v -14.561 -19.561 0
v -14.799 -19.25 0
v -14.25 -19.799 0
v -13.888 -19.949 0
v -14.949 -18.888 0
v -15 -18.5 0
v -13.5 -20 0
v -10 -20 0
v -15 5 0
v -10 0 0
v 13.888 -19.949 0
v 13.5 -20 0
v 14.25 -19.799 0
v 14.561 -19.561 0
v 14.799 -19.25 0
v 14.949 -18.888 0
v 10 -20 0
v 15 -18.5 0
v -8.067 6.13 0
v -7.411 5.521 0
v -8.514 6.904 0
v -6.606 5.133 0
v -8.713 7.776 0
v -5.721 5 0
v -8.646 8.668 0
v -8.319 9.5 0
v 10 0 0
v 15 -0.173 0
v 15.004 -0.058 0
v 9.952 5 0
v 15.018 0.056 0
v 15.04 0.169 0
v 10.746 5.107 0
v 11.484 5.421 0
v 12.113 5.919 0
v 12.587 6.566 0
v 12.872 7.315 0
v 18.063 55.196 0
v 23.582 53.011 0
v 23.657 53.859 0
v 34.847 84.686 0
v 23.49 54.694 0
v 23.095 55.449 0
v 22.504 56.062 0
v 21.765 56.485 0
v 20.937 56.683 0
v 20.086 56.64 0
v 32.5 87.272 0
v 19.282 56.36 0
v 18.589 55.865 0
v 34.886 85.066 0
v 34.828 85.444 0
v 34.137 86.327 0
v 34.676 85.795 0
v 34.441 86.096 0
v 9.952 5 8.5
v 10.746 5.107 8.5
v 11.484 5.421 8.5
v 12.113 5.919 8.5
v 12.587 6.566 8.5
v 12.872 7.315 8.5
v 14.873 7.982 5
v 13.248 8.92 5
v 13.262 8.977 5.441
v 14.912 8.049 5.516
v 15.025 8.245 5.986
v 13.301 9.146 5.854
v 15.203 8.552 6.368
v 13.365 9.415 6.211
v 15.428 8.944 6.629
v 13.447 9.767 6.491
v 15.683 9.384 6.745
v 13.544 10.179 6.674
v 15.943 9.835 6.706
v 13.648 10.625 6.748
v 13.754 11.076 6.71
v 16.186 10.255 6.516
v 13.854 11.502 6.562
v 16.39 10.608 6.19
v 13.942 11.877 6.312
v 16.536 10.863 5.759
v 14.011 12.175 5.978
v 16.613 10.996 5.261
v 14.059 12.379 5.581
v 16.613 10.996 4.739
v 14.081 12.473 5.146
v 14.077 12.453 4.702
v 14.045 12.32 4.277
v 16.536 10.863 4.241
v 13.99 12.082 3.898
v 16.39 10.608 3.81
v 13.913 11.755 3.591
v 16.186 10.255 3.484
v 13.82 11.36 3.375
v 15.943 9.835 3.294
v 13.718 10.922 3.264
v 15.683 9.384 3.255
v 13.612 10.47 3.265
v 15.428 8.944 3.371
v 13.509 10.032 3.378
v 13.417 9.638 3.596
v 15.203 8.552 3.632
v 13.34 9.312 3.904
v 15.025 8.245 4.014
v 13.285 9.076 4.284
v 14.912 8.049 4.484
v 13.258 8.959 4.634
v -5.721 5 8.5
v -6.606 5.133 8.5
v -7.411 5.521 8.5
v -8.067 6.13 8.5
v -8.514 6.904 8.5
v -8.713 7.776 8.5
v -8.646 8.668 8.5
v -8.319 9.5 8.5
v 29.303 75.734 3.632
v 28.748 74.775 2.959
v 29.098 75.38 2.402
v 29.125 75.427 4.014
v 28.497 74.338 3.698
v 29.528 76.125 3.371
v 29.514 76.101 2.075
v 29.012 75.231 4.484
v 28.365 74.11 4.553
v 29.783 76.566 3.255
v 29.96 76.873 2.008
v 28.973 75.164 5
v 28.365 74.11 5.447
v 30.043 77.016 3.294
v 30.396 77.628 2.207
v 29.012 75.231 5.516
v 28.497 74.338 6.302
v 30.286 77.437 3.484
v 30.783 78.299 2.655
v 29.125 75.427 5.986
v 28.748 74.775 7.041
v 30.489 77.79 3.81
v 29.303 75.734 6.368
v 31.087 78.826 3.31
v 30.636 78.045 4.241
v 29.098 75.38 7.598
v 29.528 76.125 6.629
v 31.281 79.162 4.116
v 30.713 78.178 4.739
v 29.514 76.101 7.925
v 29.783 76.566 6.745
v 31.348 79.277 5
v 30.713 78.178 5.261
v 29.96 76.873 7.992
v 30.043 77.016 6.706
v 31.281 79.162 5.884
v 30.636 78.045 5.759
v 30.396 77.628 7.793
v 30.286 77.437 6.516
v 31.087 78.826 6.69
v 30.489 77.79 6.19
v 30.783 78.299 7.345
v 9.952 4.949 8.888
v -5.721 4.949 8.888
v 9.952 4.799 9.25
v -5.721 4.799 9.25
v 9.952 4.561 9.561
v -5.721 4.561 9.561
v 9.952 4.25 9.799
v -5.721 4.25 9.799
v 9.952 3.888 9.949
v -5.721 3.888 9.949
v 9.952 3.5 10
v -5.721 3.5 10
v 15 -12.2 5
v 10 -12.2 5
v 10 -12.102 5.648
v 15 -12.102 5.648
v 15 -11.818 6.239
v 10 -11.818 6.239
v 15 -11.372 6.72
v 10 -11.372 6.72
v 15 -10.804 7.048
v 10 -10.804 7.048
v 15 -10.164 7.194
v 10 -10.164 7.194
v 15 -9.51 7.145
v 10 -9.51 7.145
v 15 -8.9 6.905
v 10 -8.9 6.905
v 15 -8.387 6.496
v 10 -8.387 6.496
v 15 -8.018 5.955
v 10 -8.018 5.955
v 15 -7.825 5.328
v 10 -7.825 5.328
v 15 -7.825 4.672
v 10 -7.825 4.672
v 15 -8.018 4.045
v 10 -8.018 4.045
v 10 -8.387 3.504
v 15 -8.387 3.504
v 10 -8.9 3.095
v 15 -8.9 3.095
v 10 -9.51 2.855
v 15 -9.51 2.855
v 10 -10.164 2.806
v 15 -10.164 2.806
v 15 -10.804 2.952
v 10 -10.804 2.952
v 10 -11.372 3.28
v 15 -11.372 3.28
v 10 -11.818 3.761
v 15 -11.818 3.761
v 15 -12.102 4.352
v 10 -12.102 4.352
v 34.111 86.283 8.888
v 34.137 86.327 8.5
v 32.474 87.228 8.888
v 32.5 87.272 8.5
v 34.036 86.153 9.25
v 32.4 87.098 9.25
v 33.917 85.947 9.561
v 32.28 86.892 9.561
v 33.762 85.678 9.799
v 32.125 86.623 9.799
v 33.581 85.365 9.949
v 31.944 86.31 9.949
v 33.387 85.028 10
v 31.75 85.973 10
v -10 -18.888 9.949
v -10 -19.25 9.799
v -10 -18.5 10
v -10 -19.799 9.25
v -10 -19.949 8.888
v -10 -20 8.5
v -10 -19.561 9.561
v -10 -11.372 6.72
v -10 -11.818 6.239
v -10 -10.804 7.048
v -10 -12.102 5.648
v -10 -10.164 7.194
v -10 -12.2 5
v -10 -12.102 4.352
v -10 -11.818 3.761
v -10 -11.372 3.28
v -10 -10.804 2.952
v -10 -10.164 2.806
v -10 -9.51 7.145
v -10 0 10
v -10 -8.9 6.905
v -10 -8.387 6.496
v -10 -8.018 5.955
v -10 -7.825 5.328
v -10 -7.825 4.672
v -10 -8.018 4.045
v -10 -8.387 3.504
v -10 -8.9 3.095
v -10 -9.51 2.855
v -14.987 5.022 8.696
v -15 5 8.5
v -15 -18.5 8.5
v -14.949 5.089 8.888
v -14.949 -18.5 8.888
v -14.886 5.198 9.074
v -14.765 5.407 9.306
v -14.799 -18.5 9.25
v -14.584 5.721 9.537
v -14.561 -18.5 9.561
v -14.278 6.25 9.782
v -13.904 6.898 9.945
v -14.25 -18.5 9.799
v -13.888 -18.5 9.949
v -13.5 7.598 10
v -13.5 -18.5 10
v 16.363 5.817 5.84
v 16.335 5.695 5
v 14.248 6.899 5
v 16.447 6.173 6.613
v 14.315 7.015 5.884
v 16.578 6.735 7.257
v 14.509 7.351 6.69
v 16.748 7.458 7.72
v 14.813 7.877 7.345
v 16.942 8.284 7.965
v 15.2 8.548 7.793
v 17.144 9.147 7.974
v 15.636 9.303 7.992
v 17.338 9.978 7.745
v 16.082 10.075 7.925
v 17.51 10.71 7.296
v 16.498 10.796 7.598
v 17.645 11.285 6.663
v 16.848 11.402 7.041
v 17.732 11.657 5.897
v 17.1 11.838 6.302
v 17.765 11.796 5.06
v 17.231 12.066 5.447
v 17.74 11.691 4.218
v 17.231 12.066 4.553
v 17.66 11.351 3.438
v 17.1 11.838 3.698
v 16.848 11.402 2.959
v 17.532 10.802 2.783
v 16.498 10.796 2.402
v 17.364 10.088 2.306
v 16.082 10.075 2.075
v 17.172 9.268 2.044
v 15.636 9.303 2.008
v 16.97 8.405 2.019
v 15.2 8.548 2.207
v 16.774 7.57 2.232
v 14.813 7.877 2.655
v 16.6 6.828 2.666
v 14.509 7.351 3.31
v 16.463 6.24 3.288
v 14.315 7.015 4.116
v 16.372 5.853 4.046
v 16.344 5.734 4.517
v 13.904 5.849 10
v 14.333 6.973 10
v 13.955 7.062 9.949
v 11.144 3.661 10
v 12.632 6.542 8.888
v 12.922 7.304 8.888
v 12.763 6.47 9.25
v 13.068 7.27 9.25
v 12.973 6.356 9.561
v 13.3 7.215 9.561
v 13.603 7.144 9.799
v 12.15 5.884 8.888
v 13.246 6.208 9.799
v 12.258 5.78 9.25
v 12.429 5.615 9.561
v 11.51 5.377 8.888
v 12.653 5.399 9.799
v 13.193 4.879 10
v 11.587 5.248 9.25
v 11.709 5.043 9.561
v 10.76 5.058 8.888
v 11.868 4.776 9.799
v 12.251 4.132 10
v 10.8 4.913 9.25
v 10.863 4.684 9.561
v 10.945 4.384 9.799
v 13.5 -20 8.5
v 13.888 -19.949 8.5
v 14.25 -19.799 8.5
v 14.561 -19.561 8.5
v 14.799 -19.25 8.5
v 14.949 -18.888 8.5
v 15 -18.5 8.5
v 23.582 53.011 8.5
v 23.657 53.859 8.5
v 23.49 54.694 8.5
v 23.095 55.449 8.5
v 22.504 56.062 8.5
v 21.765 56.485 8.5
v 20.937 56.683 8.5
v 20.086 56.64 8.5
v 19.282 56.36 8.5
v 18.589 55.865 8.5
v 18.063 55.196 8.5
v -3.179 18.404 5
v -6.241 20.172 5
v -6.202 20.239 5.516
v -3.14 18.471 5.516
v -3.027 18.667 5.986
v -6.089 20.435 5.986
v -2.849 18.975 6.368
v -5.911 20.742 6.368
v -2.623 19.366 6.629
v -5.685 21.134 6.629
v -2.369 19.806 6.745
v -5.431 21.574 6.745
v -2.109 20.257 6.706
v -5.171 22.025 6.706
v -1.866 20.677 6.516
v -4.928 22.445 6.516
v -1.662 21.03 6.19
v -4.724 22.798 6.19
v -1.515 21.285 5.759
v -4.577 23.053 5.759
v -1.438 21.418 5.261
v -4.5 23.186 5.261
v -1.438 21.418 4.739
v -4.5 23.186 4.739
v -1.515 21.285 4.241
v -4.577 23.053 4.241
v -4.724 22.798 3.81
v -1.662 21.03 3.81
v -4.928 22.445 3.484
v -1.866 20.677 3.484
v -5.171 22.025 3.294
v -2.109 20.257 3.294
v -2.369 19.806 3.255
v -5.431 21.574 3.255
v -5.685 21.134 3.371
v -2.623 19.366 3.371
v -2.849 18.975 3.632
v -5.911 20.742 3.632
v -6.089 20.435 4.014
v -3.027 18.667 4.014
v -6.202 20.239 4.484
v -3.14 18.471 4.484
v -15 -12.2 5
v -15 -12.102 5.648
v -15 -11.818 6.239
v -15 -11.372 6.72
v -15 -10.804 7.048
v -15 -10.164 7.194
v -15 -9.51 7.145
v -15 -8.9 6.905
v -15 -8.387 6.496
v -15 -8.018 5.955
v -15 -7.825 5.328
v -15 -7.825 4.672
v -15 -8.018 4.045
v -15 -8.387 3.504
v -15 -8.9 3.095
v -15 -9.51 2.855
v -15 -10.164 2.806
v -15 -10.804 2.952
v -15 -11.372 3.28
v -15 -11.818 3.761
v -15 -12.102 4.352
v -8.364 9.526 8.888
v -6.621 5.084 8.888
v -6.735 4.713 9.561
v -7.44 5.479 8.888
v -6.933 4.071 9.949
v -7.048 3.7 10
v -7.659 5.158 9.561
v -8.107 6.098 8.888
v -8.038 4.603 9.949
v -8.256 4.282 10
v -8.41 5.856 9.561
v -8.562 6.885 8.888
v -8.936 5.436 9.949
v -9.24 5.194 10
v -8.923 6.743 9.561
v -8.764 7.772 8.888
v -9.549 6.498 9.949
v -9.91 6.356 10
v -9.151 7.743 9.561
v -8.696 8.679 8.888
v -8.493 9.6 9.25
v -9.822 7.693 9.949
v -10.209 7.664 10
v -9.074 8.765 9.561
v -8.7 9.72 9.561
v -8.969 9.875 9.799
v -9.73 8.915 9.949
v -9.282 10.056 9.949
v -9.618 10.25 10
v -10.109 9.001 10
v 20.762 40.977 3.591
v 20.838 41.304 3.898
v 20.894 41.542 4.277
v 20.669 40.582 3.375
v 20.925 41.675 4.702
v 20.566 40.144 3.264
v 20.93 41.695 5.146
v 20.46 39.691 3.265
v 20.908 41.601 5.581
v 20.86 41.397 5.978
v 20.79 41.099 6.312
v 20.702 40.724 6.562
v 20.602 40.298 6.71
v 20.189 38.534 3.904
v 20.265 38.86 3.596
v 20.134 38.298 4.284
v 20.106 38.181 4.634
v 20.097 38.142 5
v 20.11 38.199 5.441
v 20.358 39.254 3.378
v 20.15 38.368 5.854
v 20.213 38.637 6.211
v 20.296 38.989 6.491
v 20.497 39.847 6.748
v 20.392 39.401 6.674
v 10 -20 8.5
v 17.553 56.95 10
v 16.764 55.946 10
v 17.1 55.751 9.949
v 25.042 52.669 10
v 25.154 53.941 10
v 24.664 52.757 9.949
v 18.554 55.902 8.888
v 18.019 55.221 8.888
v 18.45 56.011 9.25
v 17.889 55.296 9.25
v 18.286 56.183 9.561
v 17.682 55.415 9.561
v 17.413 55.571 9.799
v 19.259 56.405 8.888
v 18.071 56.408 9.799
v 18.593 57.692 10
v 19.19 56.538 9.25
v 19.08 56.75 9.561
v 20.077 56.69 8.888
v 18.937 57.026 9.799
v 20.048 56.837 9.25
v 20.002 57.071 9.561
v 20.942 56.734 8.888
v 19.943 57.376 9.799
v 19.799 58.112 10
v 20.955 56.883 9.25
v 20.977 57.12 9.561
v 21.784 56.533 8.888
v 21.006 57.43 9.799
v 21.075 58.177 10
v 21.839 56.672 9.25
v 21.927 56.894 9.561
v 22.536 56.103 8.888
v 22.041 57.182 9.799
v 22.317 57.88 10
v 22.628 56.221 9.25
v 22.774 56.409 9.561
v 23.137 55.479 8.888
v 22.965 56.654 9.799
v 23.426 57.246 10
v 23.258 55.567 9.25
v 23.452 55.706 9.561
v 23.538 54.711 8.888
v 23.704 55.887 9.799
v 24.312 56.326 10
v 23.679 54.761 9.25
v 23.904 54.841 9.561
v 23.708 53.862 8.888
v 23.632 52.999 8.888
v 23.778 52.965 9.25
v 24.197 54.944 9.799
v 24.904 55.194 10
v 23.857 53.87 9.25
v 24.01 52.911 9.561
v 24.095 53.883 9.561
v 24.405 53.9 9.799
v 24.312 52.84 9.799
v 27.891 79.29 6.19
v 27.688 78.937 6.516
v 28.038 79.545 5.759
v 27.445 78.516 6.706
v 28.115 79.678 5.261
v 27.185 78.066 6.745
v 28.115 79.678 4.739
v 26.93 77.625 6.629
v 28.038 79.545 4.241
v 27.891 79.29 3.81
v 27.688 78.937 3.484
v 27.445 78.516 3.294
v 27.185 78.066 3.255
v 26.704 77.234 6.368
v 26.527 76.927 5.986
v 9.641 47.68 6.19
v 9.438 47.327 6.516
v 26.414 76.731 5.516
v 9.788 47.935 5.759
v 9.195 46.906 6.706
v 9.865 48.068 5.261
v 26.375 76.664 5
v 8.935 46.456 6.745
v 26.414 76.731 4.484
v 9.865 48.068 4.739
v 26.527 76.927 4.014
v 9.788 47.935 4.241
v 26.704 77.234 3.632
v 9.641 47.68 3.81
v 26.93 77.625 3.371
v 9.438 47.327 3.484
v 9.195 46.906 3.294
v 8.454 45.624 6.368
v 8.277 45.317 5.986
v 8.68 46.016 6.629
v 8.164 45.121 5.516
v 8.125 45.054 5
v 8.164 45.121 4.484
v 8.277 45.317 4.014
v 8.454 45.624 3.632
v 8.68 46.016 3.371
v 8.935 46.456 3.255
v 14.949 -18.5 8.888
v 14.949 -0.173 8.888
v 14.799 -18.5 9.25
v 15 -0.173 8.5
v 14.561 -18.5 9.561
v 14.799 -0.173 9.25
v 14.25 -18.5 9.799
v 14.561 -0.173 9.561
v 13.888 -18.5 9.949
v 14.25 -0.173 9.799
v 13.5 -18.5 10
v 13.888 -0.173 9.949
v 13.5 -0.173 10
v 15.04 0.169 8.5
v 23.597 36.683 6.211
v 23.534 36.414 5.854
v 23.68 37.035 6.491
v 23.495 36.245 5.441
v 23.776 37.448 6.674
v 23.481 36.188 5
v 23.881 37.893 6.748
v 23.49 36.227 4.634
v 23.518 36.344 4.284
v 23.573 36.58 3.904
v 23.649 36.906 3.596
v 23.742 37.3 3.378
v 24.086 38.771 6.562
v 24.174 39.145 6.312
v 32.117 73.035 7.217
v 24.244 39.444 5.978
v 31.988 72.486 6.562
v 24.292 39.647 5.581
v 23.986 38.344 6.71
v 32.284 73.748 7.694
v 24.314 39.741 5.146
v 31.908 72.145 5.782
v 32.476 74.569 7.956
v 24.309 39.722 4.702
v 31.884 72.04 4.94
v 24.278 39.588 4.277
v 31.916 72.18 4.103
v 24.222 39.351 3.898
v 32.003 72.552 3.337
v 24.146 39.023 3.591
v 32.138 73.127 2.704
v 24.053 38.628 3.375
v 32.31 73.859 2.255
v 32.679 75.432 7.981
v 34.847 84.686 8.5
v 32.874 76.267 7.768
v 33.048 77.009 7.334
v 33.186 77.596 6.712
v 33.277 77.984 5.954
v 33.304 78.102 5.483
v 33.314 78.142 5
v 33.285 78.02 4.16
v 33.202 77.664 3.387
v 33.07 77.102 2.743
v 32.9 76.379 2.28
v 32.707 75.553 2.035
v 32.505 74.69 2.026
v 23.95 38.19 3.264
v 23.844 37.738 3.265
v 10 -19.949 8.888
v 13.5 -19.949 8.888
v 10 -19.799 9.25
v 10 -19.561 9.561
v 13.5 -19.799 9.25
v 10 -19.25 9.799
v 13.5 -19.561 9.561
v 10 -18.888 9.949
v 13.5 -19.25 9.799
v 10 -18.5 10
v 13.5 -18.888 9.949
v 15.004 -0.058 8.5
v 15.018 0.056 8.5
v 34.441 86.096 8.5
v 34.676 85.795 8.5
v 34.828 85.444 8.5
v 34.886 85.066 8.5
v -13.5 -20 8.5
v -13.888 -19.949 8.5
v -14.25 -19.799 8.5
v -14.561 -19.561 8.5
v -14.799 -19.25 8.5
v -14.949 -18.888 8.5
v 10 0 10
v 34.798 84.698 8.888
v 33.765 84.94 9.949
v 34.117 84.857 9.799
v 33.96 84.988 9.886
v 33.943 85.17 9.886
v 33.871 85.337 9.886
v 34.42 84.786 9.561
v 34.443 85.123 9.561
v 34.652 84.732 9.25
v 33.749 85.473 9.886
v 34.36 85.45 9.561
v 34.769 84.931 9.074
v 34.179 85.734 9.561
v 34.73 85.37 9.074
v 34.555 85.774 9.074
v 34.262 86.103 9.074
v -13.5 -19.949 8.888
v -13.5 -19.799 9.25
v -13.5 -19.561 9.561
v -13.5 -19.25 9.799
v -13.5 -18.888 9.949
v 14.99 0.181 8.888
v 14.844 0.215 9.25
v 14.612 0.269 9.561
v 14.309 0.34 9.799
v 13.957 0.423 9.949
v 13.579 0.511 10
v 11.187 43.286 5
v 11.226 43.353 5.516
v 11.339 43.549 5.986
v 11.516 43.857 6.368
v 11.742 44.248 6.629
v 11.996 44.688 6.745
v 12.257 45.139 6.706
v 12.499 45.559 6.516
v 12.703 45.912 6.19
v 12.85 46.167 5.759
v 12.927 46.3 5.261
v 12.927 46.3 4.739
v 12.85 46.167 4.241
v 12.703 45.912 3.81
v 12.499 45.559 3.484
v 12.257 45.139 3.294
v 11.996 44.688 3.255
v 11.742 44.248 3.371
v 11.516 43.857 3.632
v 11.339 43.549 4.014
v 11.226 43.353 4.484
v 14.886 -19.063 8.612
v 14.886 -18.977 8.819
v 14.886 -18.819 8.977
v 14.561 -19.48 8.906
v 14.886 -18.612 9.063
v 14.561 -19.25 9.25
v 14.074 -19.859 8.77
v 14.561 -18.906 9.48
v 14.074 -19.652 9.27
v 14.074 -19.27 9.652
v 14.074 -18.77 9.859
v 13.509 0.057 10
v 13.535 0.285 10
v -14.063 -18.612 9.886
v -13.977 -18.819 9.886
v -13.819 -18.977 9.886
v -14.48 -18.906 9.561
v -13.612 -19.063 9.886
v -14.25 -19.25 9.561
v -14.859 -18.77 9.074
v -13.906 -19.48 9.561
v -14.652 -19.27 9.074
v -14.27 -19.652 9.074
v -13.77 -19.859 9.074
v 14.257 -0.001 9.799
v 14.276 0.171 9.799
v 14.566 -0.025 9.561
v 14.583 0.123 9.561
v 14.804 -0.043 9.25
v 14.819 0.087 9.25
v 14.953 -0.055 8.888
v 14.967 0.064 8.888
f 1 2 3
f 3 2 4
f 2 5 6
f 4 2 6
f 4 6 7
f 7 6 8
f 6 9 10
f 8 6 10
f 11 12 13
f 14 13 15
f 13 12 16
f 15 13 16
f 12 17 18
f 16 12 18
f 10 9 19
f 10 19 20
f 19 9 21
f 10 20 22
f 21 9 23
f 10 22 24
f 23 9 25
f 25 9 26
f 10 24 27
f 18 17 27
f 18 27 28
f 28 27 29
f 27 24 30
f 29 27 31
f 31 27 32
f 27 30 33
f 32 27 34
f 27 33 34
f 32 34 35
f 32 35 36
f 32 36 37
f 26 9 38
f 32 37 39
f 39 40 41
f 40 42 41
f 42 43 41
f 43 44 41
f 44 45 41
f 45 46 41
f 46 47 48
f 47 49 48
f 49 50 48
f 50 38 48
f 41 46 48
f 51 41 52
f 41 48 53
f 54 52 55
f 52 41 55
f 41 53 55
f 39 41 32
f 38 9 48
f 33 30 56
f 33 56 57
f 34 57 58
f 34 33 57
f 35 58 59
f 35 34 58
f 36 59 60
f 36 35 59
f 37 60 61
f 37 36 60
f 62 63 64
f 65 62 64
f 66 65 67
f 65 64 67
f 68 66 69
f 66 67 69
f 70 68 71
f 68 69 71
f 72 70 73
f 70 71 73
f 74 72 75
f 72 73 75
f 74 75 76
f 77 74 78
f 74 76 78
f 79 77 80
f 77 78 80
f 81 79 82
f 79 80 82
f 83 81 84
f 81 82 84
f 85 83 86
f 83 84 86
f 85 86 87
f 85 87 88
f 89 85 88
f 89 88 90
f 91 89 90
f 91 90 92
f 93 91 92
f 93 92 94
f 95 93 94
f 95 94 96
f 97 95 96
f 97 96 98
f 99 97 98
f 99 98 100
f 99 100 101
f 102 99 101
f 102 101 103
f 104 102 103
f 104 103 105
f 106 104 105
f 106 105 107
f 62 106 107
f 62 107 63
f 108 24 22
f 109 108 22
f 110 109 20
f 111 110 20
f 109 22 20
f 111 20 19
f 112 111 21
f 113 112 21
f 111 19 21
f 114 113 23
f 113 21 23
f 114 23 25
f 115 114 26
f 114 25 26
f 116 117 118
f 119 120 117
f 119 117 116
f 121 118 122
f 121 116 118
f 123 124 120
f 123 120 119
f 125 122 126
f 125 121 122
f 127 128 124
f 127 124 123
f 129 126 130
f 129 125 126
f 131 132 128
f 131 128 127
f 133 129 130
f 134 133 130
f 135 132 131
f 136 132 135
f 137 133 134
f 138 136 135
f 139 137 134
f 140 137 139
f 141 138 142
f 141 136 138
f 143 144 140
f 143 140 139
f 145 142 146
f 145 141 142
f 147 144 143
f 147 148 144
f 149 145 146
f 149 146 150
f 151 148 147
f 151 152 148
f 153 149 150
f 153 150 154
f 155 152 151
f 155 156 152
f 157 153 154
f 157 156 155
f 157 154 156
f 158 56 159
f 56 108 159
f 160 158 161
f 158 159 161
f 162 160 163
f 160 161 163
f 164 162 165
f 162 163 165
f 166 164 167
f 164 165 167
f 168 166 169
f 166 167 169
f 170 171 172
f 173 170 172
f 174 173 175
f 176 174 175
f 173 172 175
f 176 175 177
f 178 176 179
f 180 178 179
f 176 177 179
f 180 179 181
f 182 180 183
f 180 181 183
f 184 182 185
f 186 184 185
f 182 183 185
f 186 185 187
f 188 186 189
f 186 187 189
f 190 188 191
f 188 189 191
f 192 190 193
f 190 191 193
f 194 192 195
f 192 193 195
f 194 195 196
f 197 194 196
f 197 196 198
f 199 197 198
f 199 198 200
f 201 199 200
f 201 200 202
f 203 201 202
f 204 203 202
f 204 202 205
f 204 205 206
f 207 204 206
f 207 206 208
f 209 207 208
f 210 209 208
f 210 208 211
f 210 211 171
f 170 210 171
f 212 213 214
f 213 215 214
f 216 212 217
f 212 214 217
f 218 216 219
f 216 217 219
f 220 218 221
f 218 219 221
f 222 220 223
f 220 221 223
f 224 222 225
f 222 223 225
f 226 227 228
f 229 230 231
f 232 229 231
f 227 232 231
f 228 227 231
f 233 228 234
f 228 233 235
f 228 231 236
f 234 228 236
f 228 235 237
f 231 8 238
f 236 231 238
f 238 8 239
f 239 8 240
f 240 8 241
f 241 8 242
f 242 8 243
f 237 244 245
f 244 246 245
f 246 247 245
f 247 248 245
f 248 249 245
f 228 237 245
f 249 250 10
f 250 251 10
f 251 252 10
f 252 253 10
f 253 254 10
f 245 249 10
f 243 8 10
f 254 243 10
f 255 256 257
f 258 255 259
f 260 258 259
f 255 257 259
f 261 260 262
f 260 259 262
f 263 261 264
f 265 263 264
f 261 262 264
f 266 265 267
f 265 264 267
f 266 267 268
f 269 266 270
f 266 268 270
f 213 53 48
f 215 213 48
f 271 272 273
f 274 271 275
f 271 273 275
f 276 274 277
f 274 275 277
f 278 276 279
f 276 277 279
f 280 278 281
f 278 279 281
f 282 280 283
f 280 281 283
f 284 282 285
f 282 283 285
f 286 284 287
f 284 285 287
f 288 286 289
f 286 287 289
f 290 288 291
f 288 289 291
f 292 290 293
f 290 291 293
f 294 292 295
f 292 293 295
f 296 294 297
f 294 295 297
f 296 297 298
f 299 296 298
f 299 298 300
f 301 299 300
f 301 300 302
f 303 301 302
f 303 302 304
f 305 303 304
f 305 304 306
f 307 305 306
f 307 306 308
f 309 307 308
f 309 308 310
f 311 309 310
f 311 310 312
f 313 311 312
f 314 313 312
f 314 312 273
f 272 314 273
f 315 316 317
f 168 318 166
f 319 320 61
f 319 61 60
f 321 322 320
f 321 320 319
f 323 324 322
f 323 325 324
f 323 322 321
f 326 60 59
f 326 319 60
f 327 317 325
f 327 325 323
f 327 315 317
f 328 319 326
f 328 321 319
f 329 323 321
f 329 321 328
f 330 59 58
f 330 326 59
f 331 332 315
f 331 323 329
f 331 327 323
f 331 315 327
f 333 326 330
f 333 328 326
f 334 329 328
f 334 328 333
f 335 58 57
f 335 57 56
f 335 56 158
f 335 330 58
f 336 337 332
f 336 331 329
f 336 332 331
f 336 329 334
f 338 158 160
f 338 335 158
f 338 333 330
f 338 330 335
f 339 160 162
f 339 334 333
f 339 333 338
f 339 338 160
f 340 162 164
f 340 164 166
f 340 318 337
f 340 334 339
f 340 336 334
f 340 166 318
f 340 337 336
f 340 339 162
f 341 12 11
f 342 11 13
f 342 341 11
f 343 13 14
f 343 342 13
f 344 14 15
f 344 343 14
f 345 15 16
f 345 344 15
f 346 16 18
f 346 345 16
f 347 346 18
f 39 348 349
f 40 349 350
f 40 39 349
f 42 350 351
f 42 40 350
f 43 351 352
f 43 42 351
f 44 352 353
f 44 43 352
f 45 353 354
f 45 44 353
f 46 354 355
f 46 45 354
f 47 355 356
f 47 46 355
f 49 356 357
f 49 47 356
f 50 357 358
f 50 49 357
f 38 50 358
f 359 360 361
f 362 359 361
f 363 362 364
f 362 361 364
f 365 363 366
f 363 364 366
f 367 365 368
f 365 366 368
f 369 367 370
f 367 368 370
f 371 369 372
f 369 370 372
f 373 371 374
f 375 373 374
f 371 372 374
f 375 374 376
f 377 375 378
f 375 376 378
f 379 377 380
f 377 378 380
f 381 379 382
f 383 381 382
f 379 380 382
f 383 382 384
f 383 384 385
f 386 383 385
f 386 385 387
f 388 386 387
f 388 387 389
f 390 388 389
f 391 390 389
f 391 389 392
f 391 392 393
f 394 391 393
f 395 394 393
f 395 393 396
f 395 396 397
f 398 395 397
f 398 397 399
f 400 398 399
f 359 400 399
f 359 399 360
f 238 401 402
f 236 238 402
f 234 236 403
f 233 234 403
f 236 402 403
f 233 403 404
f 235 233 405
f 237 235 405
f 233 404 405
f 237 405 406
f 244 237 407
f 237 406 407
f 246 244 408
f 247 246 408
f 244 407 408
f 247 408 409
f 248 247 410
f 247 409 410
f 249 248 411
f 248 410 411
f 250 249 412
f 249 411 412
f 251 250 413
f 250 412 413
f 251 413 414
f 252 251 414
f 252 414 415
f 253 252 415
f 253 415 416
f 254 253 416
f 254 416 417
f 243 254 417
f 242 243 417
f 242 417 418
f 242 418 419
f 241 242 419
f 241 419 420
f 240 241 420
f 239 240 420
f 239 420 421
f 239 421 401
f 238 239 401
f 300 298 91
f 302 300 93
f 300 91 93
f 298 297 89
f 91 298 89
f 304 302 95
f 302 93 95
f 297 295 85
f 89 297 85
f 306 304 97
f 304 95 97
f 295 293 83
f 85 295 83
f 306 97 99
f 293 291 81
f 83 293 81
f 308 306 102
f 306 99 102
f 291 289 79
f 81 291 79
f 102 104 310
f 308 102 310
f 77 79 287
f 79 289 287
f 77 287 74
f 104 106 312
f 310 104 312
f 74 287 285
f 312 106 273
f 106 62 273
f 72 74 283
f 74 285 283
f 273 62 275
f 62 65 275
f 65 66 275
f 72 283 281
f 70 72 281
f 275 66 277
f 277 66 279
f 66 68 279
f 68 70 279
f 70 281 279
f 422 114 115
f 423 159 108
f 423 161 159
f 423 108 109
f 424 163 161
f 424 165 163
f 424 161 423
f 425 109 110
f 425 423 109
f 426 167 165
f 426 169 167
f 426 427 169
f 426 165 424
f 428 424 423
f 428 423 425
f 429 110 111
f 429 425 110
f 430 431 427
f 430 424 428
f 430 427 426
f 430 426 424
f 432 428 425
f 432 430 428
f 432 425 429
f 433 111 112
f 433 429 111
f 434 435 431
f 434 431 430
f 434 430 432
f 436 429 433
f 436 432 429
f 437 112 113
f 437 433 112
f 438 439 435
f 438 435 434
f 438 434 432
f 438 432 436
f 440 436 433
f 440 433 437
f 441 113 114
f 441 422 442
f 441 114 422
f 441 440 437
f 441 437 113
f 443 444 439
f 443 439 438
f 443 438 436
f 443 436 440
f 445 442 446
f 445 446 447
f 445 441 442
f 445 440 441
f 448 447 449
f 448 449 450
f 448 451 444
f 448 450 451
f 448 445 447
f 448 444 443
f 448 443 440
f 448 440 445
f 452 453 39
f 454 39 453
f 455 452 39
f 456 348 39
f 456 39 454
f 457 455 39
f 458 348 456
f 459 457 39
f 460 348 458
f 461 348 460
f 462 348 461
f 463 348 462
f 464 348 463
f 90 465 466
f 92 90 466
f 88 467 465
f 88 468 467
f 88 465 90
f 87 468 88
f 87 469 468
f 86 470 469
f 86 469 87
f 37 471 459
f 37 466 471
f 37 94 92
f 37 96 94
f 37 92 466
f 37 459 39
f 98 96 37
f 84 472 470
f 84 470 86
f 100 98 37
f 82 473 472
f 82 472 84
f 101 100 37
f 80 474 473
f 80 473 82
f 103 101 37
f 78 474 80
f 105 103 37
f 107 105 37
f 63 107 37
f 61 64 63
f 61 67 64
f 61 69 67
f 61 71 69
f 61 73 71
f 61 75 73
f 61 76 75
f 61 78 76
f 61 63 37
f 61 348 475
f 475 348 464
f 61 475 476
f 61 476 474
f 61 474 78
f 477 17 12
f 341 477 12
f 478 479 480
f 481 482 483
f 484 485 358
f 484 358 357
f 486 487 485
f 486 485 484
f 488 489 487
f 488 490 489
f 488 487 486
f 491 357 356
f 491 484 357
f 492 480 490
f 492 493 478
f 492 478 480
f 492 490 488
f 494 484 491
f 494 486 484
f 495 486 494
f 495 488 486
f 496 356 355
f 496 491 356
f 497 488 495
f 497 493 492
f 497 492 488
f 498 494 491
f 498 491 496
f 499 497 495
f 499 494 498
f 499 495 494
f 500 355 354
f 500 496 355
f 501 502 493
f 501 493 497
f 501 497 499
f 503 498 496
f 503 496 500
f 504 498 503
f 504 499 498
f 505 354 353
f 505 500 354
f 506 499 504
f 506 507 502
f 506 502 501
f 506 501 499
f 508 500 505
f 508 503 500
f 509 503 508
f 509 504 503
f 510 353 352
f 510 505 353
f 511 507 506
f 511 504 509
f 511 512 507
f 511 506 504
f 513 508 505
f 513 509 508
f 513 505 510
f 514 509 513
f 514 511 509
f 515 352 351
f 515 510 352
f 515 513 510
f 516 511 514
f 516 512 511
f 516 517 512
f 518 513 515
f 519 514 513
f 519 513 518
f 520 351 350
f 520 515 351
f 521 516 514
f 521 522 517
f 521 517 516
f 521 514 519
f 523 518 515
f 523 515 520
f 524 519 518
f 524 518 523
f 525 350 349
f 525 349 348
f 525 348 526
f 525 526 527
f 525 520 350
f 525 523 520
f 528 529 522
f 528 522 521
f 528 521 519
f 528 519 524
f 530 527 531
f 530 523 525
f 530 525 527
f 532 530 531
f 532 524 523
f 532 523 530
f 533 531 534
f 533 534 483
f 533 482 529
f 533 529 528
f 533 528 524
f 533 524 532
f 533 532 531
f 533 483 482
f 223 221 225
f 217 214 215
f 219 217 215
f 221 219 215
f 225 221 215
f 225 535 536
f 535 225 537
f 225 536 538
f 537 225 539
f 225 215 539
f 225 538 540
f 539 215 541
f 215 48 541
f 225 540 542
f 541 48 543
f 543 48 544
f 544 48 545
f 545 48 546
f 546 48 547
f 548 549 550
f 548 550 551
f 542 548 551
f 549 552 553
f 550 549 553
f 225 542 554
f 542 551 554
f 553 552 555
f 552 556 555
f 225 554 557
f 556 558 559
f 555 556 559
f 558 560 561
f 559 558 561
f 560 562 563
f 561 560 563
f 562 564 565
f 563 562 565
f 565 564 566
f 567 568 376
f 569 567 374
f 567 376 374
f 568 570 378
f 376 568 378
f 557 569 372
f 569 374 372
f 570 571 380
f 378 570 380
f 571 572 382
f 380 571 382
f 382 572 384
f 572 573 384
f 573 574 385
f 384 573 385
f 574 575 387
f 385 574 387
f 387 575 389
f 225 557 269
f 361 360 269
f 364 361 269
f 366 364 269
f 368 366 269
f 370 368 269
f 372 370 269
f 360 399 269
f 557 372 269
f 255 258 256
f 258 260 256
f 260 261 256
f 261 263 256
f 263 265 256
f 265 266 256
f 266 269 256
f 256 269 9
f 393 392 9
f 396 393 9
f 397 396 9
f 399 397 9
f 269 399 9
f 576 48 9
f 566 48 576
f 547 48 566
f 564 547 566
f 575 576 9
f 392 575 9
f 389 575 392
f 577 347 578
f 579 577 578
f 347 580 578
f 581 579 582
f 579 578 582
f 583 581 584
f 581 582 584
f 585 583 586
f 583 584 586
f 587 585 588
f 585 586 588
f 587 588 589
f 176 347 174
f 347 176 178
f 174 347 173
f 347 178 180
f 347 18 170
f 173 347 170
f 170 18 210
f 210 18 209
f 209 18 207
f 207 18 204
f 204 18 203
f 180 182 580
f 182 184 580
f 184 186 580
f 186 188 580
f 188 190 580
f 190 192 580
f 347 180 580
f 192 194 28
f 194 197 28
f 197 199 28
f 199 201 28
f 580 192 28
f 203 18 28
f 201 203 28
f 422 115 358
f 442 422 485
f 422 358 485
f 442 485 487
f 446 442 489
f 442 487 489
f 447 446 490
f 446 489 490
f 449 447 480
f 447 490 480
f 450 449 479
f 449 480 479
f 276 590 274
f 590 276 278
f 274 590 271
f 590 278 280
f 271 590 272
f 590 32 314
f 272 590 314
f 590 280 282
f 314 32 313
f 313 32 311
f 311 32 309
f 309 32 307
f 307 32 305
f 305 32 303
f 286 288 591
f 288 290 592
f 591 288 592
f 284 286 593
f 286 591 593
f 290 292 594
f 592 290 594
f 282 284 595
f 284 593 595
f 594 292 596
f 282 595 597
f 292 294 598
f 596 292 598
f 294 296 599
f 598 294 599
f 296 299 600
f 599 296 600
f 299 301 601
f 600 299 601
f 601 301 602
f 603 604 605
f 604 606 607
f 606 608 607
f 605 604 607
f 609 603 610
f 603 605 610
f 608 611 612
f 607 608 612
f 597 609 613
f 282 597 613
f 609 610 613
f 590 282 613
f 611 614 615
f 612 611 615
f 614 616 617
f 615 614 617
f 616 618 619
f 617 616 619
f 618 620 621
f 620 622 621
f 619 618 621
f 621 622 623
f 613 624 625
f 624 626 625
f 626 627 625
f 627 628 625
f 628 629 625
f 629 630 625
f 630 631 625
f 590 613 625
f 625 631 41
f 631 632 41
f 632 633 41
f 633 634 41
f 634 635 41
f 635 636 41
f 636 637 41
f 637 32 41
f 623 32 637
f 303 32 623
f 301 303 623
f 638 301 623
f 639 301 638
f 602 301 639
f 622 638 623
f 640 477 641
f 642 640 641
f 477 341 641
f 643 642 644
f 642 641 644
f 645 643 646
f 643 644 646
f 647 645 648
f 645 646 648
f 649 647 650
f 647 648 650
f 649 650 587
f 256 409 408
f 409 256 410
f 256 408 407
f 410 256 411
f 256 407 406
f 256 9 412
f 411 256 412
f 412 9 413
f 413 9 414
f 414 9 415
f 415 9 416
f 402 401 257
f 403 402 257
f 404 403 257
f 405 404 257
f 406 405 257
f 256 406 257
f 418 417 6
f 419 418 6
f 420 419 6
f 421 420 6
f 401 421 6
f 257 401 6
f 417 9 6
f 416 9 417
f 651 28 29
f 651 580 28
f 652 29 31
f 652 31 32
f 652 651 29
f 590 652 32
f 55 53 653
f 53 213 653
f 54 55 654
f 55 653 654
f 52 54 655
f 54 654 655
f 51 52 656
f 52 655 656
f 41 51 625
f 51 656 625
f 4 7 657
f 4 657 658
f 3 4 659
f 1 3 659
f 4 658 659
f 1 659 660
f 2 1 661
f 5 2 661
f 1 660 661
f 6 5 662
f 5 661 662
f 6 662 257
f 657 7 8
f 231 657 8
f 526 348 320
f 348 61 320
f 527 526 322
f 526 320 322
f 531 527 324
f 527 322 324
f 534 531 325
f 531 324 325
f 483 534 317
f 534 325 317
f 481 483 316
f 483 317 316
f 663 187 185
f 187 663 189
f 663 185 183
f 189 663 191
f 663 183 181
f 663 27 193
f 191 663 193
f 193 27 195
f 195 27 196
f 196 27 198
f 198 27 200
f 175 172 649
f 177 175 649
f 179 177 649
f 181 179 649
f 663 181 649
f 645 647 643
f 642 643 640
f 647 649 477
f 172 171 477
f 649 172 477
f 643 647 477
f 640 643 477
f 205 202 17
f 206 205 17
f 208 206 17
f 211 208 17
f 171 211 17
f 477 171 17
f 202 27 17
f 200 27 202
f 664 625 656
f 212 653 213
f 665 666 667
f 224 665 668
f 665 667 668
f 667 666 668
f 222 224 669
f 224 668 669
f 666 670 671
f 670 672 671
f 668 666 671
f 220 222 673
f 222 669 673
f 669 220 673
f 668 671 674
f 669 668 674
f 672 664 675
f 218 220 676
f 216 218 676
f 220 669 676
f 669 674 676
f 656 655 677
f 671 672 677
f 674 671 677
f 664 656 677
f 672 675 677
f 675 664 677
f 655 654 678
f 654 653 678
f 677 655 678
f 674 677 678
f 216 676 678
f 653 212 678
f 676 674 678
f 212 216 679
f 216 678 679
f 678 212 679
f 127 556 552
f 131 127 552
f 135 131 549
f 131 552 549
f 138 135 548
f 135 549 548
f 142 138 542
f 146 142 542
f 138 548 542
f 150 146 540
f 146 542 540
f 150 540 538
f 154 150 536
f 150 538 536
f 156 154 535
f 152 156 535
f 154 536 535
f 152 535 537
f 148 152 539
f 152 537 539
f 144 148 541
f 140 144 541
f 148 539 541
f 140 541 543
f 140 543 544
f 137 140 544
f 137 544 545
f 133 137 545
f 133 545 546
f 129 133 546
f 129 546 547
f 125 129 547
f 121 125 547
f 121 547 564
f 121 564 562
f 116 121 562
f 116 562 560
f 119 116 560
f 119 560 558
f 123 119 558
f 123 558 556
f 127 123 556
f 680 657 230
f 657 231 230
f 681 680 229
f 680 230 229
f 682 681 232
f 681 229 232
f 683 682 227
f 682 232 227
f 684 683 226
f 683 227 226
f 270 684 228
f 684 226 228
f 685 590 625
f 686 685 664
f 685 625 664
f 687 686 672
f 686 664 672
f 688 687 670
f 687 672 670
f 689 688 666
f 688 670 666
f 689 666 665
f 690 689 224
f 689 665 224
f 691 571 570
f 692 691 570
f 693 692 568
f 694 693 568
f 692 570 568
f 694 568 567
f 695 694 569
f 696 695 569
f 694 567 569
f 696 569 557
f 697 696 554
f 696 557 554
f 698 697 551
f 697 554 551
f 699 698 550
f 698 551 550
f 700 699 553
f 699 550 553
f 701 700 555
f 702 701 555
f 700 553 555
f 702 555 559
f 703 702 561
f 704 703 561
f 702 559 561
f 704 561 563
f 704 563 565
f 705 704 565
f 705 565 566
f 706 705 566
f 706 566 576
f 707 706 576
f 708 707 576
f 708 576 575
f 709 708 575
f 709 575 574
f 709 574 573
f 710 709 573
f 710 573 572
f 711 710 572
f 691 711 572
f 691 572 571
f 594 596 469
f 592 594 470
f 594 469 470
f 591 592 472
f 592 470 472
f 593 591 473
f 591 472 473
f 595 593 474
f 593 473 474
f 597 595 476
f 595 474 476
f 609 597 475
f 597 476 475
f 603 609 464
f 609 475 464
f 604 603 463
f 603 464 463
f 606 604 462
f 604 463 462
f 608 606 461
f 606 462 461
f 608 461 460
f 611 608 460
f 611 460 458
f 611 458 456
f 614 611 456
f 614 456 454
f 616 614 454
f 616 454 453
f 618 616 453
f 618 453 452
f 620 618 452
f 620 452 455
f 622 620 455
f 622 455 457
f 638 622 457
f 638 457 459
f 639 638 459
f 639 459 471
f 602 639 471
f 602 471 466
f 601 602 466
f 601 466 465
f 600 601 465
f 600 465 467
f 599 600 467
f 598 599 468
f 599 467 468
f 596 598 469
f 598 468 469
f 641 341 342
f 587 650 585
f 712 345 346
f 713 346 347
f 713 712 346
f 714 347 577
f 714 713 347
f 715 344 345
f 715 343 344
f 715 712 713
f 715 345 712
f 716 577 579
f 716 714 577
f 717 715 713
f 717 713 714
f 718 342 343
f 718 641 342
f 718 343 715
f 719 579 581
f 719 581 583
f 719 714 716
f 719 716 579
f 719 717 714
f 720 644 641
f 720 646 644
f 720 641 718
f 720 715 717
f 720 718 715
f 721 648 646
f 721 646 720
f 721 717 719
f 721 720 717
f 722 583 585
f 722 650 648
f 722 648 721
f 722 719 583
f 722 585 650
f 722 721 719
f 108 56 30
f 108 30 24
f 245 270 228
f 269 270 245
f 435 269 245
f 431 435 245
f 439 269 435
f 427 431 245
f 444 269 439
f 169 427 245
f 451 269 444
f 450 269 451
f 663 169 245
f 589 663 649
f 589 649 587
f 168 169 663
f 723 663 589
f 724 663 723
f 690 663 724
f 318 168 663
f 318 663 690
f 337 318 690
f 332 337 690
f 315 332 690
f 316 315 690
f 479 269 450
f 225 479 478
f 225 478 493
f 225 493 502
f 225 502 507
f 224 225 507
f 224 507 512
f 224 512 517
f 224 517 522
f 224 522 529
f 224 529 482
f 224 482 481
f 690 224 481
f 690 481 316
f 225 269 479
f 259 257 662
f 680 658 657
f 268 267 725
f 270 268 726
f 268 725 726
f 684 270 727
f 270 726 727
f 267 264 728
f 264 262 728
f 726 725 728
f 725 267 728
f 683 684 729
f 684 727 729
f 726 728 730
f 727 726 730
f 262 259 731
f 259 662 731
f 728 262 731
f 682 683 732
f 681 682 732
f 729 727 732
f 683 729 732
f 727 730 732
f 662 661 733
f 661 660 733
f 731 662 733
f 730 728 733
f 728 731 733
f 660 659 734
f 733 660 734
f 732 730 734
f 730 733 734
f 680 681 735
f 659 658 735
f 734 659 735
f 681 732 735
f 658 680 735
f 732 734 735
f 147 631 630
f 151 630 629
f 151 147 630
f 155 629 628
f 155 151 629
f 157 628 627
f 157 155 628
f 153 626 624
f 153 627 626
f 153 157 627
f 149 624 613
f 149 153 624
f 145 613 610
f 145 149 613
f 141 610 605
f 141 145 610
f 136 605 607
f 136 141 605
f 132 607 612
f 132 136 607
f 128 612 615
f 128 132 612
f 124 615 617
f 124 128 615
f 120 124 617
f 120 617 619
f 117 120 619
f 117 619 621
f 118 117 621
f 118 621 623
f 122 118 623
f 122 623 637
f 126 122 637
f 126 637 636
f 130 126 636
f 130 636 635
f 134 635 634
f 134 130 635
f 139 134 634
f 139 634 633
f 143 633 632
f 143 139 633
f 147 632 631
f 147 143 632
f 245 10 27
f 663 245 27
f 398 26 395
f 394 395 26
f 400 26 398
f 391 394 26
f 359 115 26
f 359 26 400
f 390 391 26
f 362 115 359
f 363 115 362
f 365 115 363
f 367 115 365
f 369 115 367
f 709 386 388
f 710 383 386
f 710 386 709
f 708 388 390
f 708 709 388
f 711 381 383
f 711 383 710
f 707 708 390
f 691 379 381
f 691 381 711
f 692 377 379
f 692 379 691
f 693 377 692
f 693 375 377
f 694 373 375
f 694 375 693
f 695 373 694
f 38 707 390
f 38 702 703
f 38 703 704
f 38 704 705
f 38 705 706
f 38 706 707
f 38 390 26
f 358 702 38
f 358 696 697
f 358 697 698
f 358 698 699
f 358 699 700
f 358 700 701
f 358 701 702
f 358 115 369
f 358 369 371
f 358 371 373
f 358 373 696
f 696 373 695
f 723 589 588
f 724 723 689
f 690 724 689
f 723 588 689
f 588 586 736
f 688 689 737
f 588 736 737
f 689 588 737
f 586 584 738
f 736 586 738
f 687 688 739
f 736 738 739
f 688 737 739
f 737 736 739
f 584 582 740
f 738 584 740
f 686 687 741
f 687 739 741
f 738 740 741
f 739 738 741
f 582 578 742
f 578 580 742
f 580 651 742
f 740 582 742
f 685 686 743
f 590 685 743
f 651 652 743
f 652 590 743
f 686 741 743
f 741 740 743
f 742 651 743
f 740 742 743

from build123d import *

# Parameters (mm, degrees)
BOSS_EXTRUDE1_DEPTH = 10
CUT_EXTRUDE1_DEPTH  = 95.596978287
FILLET1_R           = 3
FILLET2_R           = 1.5
SKETCH3_R           = 2.2
CUT_EXTRUDE2_DEPTH  = 102.020680113
SKETCH4_R           = 1.75
CUT_EXTRUDE3_DEPTH  = 94.58236857
CUT_EXTRUDE4_START  = 3
SKETCH5_R           = 3
CUT_EXTRUDE4_DEPTH  = 91.712514751
CUT_EXTRUDE5_START  = -24.38
SKETCH6_R           = 3
CUT_EXTRUDE5_DEPTH  = 70.20236857


with BuildPart() as part:
    # Sketch1 → Boss-Extrude1 (new body)
    with BuildSketch(Plane.XY):
        Polygon((-10, -20), (-10, 0), (10, 0), (10, -20), (15, -20), (15, 0), (35.101483834, 85.770445967), (32.5, 87.27241336), (-15, 5), (-15, -20), align=None)
    extrude(amount=BOSS_EXTRUDE1_DEPTH)

    # Sketch2 → Cut-Extrude1 (cut, through all)
    with BuildSketch(Plane.XY.offset(10)):
        Polygon((-10.917498512, 5), (28.214788811, 72.779109859), (12.329822075, 5), align=None)
    extrude(amount=-CUT_EXTRUDE1_DEPTH, mode=Mode.SUBTRACT)

    # Fillet1
    fillet1_edges = [part.edges().sort_by_distance(p)[0] for p in [
        (28.214788811, 72.779109859, 5),
        (12.329822075, 5, 5),
        (-10.917498512, 5, 5),
    ]]
    fillet(fillet1_edges, radius=FILLET1_R)

    # Fillet2
    fillet2_edges = [part.edges().sort_by_distance(p)[0] for p in [
        (12.5, -20, 10),
        (-15, -20, 5),
        (35.101483834, 85.770445967, 5),
        (15, 0, 5),
        (15, -20, 5),
        (15, -10, 10),
        (25.050741917, 42.885222984, 10),
        (33.800741917, 86.521429663, 10),
        (-15, -7.5, 10),
        (-12.5, -20, 10),
        (4.871758353, 32.347795103, 10),
        (18.227176379, 30.163252268, 10),
        (2.115139497, 5, 10),
        (21.765145456, 56.485016027, 10),
        (11.815273588, 5.649082253, 10),
        (-8.3194223, 6.5, 10),
    ]]
    fillet(fillet2_edges, radius=FILLET2_R)

    # Sketch3 → Cut-Extrude2 (cut, through all)
    with BuildSketch(Plane.ZY.offset(15)):
        with Locations(Location((5, -10, 0), (0, 0, 270))):
            Circle(SKETCH3_R)
    extrude(amount=-CUT_EXTRUDE2_DEPTH, mode=Mode.SUBTRACT)

    # Sketch4 → Cut-Extrude3 (cut, through all)
    with BuildSketch(Plane(origin=(-13.415063509, 7.745190528, 0), x_dir=(0, 0, 1), z_dir=(-0.8660254037844382, 0.500000000000001, 0))):
        with Locations(Location((5, 81.330127019, 0), (0, 0, 270))):
            Circle(SKETCH4_R)
        with Locations(Location((5, 44.830127019, 0), (0, 0, 270))):
            Circle(SKETCH4_R)
        with Locations(Location((5, 16.098937019, 0), (0, 0, 270))):
            Circle(SKETCH4_R)
    extrude(amount=-CUT_EXTRUDE3_DEPTH, mode=Mode.SUBTRACT)

    # Sketch5 → Cut-Extrude4 (cut, through all)
    with BuildSketch(Plane(origin=(-13.480526942, 7.631804537, 0), x_dir=(0, 0, -1), z_dir=(0.866025403784438, -0.5000000000000009, 0)).offset(CUT_EXTRUDE4_START)):
        with Locations(Location((-5, 81.461053884, 0), (0, 0, 90))):
            Circle(SKETCH5_R)
    extrude(amount=CUT_EXTRUDE4_DEPTH, mode=Mode.SUBTRACT)

    # Sketch6 → Cut-Extrude5 (cut, through all)
    with BuildSketch(Plane(origin=(-13.415063509, 7.745190528, 0), x_dir=(0, 0, 1), z_dir=(-0.8660254037844382, 0.500000000000001, 0)).offset(CUT_EXTRUDE5_START)):
        with Locations(Location((5, 16.098937019, 0), (0, 0, 270))):
            Circle(SKETCH6_R)
    extrude(amount=-CUT_EXTRUDE5_DEPTH, mode=Mode.SUBTRACT)


solid = part.part
